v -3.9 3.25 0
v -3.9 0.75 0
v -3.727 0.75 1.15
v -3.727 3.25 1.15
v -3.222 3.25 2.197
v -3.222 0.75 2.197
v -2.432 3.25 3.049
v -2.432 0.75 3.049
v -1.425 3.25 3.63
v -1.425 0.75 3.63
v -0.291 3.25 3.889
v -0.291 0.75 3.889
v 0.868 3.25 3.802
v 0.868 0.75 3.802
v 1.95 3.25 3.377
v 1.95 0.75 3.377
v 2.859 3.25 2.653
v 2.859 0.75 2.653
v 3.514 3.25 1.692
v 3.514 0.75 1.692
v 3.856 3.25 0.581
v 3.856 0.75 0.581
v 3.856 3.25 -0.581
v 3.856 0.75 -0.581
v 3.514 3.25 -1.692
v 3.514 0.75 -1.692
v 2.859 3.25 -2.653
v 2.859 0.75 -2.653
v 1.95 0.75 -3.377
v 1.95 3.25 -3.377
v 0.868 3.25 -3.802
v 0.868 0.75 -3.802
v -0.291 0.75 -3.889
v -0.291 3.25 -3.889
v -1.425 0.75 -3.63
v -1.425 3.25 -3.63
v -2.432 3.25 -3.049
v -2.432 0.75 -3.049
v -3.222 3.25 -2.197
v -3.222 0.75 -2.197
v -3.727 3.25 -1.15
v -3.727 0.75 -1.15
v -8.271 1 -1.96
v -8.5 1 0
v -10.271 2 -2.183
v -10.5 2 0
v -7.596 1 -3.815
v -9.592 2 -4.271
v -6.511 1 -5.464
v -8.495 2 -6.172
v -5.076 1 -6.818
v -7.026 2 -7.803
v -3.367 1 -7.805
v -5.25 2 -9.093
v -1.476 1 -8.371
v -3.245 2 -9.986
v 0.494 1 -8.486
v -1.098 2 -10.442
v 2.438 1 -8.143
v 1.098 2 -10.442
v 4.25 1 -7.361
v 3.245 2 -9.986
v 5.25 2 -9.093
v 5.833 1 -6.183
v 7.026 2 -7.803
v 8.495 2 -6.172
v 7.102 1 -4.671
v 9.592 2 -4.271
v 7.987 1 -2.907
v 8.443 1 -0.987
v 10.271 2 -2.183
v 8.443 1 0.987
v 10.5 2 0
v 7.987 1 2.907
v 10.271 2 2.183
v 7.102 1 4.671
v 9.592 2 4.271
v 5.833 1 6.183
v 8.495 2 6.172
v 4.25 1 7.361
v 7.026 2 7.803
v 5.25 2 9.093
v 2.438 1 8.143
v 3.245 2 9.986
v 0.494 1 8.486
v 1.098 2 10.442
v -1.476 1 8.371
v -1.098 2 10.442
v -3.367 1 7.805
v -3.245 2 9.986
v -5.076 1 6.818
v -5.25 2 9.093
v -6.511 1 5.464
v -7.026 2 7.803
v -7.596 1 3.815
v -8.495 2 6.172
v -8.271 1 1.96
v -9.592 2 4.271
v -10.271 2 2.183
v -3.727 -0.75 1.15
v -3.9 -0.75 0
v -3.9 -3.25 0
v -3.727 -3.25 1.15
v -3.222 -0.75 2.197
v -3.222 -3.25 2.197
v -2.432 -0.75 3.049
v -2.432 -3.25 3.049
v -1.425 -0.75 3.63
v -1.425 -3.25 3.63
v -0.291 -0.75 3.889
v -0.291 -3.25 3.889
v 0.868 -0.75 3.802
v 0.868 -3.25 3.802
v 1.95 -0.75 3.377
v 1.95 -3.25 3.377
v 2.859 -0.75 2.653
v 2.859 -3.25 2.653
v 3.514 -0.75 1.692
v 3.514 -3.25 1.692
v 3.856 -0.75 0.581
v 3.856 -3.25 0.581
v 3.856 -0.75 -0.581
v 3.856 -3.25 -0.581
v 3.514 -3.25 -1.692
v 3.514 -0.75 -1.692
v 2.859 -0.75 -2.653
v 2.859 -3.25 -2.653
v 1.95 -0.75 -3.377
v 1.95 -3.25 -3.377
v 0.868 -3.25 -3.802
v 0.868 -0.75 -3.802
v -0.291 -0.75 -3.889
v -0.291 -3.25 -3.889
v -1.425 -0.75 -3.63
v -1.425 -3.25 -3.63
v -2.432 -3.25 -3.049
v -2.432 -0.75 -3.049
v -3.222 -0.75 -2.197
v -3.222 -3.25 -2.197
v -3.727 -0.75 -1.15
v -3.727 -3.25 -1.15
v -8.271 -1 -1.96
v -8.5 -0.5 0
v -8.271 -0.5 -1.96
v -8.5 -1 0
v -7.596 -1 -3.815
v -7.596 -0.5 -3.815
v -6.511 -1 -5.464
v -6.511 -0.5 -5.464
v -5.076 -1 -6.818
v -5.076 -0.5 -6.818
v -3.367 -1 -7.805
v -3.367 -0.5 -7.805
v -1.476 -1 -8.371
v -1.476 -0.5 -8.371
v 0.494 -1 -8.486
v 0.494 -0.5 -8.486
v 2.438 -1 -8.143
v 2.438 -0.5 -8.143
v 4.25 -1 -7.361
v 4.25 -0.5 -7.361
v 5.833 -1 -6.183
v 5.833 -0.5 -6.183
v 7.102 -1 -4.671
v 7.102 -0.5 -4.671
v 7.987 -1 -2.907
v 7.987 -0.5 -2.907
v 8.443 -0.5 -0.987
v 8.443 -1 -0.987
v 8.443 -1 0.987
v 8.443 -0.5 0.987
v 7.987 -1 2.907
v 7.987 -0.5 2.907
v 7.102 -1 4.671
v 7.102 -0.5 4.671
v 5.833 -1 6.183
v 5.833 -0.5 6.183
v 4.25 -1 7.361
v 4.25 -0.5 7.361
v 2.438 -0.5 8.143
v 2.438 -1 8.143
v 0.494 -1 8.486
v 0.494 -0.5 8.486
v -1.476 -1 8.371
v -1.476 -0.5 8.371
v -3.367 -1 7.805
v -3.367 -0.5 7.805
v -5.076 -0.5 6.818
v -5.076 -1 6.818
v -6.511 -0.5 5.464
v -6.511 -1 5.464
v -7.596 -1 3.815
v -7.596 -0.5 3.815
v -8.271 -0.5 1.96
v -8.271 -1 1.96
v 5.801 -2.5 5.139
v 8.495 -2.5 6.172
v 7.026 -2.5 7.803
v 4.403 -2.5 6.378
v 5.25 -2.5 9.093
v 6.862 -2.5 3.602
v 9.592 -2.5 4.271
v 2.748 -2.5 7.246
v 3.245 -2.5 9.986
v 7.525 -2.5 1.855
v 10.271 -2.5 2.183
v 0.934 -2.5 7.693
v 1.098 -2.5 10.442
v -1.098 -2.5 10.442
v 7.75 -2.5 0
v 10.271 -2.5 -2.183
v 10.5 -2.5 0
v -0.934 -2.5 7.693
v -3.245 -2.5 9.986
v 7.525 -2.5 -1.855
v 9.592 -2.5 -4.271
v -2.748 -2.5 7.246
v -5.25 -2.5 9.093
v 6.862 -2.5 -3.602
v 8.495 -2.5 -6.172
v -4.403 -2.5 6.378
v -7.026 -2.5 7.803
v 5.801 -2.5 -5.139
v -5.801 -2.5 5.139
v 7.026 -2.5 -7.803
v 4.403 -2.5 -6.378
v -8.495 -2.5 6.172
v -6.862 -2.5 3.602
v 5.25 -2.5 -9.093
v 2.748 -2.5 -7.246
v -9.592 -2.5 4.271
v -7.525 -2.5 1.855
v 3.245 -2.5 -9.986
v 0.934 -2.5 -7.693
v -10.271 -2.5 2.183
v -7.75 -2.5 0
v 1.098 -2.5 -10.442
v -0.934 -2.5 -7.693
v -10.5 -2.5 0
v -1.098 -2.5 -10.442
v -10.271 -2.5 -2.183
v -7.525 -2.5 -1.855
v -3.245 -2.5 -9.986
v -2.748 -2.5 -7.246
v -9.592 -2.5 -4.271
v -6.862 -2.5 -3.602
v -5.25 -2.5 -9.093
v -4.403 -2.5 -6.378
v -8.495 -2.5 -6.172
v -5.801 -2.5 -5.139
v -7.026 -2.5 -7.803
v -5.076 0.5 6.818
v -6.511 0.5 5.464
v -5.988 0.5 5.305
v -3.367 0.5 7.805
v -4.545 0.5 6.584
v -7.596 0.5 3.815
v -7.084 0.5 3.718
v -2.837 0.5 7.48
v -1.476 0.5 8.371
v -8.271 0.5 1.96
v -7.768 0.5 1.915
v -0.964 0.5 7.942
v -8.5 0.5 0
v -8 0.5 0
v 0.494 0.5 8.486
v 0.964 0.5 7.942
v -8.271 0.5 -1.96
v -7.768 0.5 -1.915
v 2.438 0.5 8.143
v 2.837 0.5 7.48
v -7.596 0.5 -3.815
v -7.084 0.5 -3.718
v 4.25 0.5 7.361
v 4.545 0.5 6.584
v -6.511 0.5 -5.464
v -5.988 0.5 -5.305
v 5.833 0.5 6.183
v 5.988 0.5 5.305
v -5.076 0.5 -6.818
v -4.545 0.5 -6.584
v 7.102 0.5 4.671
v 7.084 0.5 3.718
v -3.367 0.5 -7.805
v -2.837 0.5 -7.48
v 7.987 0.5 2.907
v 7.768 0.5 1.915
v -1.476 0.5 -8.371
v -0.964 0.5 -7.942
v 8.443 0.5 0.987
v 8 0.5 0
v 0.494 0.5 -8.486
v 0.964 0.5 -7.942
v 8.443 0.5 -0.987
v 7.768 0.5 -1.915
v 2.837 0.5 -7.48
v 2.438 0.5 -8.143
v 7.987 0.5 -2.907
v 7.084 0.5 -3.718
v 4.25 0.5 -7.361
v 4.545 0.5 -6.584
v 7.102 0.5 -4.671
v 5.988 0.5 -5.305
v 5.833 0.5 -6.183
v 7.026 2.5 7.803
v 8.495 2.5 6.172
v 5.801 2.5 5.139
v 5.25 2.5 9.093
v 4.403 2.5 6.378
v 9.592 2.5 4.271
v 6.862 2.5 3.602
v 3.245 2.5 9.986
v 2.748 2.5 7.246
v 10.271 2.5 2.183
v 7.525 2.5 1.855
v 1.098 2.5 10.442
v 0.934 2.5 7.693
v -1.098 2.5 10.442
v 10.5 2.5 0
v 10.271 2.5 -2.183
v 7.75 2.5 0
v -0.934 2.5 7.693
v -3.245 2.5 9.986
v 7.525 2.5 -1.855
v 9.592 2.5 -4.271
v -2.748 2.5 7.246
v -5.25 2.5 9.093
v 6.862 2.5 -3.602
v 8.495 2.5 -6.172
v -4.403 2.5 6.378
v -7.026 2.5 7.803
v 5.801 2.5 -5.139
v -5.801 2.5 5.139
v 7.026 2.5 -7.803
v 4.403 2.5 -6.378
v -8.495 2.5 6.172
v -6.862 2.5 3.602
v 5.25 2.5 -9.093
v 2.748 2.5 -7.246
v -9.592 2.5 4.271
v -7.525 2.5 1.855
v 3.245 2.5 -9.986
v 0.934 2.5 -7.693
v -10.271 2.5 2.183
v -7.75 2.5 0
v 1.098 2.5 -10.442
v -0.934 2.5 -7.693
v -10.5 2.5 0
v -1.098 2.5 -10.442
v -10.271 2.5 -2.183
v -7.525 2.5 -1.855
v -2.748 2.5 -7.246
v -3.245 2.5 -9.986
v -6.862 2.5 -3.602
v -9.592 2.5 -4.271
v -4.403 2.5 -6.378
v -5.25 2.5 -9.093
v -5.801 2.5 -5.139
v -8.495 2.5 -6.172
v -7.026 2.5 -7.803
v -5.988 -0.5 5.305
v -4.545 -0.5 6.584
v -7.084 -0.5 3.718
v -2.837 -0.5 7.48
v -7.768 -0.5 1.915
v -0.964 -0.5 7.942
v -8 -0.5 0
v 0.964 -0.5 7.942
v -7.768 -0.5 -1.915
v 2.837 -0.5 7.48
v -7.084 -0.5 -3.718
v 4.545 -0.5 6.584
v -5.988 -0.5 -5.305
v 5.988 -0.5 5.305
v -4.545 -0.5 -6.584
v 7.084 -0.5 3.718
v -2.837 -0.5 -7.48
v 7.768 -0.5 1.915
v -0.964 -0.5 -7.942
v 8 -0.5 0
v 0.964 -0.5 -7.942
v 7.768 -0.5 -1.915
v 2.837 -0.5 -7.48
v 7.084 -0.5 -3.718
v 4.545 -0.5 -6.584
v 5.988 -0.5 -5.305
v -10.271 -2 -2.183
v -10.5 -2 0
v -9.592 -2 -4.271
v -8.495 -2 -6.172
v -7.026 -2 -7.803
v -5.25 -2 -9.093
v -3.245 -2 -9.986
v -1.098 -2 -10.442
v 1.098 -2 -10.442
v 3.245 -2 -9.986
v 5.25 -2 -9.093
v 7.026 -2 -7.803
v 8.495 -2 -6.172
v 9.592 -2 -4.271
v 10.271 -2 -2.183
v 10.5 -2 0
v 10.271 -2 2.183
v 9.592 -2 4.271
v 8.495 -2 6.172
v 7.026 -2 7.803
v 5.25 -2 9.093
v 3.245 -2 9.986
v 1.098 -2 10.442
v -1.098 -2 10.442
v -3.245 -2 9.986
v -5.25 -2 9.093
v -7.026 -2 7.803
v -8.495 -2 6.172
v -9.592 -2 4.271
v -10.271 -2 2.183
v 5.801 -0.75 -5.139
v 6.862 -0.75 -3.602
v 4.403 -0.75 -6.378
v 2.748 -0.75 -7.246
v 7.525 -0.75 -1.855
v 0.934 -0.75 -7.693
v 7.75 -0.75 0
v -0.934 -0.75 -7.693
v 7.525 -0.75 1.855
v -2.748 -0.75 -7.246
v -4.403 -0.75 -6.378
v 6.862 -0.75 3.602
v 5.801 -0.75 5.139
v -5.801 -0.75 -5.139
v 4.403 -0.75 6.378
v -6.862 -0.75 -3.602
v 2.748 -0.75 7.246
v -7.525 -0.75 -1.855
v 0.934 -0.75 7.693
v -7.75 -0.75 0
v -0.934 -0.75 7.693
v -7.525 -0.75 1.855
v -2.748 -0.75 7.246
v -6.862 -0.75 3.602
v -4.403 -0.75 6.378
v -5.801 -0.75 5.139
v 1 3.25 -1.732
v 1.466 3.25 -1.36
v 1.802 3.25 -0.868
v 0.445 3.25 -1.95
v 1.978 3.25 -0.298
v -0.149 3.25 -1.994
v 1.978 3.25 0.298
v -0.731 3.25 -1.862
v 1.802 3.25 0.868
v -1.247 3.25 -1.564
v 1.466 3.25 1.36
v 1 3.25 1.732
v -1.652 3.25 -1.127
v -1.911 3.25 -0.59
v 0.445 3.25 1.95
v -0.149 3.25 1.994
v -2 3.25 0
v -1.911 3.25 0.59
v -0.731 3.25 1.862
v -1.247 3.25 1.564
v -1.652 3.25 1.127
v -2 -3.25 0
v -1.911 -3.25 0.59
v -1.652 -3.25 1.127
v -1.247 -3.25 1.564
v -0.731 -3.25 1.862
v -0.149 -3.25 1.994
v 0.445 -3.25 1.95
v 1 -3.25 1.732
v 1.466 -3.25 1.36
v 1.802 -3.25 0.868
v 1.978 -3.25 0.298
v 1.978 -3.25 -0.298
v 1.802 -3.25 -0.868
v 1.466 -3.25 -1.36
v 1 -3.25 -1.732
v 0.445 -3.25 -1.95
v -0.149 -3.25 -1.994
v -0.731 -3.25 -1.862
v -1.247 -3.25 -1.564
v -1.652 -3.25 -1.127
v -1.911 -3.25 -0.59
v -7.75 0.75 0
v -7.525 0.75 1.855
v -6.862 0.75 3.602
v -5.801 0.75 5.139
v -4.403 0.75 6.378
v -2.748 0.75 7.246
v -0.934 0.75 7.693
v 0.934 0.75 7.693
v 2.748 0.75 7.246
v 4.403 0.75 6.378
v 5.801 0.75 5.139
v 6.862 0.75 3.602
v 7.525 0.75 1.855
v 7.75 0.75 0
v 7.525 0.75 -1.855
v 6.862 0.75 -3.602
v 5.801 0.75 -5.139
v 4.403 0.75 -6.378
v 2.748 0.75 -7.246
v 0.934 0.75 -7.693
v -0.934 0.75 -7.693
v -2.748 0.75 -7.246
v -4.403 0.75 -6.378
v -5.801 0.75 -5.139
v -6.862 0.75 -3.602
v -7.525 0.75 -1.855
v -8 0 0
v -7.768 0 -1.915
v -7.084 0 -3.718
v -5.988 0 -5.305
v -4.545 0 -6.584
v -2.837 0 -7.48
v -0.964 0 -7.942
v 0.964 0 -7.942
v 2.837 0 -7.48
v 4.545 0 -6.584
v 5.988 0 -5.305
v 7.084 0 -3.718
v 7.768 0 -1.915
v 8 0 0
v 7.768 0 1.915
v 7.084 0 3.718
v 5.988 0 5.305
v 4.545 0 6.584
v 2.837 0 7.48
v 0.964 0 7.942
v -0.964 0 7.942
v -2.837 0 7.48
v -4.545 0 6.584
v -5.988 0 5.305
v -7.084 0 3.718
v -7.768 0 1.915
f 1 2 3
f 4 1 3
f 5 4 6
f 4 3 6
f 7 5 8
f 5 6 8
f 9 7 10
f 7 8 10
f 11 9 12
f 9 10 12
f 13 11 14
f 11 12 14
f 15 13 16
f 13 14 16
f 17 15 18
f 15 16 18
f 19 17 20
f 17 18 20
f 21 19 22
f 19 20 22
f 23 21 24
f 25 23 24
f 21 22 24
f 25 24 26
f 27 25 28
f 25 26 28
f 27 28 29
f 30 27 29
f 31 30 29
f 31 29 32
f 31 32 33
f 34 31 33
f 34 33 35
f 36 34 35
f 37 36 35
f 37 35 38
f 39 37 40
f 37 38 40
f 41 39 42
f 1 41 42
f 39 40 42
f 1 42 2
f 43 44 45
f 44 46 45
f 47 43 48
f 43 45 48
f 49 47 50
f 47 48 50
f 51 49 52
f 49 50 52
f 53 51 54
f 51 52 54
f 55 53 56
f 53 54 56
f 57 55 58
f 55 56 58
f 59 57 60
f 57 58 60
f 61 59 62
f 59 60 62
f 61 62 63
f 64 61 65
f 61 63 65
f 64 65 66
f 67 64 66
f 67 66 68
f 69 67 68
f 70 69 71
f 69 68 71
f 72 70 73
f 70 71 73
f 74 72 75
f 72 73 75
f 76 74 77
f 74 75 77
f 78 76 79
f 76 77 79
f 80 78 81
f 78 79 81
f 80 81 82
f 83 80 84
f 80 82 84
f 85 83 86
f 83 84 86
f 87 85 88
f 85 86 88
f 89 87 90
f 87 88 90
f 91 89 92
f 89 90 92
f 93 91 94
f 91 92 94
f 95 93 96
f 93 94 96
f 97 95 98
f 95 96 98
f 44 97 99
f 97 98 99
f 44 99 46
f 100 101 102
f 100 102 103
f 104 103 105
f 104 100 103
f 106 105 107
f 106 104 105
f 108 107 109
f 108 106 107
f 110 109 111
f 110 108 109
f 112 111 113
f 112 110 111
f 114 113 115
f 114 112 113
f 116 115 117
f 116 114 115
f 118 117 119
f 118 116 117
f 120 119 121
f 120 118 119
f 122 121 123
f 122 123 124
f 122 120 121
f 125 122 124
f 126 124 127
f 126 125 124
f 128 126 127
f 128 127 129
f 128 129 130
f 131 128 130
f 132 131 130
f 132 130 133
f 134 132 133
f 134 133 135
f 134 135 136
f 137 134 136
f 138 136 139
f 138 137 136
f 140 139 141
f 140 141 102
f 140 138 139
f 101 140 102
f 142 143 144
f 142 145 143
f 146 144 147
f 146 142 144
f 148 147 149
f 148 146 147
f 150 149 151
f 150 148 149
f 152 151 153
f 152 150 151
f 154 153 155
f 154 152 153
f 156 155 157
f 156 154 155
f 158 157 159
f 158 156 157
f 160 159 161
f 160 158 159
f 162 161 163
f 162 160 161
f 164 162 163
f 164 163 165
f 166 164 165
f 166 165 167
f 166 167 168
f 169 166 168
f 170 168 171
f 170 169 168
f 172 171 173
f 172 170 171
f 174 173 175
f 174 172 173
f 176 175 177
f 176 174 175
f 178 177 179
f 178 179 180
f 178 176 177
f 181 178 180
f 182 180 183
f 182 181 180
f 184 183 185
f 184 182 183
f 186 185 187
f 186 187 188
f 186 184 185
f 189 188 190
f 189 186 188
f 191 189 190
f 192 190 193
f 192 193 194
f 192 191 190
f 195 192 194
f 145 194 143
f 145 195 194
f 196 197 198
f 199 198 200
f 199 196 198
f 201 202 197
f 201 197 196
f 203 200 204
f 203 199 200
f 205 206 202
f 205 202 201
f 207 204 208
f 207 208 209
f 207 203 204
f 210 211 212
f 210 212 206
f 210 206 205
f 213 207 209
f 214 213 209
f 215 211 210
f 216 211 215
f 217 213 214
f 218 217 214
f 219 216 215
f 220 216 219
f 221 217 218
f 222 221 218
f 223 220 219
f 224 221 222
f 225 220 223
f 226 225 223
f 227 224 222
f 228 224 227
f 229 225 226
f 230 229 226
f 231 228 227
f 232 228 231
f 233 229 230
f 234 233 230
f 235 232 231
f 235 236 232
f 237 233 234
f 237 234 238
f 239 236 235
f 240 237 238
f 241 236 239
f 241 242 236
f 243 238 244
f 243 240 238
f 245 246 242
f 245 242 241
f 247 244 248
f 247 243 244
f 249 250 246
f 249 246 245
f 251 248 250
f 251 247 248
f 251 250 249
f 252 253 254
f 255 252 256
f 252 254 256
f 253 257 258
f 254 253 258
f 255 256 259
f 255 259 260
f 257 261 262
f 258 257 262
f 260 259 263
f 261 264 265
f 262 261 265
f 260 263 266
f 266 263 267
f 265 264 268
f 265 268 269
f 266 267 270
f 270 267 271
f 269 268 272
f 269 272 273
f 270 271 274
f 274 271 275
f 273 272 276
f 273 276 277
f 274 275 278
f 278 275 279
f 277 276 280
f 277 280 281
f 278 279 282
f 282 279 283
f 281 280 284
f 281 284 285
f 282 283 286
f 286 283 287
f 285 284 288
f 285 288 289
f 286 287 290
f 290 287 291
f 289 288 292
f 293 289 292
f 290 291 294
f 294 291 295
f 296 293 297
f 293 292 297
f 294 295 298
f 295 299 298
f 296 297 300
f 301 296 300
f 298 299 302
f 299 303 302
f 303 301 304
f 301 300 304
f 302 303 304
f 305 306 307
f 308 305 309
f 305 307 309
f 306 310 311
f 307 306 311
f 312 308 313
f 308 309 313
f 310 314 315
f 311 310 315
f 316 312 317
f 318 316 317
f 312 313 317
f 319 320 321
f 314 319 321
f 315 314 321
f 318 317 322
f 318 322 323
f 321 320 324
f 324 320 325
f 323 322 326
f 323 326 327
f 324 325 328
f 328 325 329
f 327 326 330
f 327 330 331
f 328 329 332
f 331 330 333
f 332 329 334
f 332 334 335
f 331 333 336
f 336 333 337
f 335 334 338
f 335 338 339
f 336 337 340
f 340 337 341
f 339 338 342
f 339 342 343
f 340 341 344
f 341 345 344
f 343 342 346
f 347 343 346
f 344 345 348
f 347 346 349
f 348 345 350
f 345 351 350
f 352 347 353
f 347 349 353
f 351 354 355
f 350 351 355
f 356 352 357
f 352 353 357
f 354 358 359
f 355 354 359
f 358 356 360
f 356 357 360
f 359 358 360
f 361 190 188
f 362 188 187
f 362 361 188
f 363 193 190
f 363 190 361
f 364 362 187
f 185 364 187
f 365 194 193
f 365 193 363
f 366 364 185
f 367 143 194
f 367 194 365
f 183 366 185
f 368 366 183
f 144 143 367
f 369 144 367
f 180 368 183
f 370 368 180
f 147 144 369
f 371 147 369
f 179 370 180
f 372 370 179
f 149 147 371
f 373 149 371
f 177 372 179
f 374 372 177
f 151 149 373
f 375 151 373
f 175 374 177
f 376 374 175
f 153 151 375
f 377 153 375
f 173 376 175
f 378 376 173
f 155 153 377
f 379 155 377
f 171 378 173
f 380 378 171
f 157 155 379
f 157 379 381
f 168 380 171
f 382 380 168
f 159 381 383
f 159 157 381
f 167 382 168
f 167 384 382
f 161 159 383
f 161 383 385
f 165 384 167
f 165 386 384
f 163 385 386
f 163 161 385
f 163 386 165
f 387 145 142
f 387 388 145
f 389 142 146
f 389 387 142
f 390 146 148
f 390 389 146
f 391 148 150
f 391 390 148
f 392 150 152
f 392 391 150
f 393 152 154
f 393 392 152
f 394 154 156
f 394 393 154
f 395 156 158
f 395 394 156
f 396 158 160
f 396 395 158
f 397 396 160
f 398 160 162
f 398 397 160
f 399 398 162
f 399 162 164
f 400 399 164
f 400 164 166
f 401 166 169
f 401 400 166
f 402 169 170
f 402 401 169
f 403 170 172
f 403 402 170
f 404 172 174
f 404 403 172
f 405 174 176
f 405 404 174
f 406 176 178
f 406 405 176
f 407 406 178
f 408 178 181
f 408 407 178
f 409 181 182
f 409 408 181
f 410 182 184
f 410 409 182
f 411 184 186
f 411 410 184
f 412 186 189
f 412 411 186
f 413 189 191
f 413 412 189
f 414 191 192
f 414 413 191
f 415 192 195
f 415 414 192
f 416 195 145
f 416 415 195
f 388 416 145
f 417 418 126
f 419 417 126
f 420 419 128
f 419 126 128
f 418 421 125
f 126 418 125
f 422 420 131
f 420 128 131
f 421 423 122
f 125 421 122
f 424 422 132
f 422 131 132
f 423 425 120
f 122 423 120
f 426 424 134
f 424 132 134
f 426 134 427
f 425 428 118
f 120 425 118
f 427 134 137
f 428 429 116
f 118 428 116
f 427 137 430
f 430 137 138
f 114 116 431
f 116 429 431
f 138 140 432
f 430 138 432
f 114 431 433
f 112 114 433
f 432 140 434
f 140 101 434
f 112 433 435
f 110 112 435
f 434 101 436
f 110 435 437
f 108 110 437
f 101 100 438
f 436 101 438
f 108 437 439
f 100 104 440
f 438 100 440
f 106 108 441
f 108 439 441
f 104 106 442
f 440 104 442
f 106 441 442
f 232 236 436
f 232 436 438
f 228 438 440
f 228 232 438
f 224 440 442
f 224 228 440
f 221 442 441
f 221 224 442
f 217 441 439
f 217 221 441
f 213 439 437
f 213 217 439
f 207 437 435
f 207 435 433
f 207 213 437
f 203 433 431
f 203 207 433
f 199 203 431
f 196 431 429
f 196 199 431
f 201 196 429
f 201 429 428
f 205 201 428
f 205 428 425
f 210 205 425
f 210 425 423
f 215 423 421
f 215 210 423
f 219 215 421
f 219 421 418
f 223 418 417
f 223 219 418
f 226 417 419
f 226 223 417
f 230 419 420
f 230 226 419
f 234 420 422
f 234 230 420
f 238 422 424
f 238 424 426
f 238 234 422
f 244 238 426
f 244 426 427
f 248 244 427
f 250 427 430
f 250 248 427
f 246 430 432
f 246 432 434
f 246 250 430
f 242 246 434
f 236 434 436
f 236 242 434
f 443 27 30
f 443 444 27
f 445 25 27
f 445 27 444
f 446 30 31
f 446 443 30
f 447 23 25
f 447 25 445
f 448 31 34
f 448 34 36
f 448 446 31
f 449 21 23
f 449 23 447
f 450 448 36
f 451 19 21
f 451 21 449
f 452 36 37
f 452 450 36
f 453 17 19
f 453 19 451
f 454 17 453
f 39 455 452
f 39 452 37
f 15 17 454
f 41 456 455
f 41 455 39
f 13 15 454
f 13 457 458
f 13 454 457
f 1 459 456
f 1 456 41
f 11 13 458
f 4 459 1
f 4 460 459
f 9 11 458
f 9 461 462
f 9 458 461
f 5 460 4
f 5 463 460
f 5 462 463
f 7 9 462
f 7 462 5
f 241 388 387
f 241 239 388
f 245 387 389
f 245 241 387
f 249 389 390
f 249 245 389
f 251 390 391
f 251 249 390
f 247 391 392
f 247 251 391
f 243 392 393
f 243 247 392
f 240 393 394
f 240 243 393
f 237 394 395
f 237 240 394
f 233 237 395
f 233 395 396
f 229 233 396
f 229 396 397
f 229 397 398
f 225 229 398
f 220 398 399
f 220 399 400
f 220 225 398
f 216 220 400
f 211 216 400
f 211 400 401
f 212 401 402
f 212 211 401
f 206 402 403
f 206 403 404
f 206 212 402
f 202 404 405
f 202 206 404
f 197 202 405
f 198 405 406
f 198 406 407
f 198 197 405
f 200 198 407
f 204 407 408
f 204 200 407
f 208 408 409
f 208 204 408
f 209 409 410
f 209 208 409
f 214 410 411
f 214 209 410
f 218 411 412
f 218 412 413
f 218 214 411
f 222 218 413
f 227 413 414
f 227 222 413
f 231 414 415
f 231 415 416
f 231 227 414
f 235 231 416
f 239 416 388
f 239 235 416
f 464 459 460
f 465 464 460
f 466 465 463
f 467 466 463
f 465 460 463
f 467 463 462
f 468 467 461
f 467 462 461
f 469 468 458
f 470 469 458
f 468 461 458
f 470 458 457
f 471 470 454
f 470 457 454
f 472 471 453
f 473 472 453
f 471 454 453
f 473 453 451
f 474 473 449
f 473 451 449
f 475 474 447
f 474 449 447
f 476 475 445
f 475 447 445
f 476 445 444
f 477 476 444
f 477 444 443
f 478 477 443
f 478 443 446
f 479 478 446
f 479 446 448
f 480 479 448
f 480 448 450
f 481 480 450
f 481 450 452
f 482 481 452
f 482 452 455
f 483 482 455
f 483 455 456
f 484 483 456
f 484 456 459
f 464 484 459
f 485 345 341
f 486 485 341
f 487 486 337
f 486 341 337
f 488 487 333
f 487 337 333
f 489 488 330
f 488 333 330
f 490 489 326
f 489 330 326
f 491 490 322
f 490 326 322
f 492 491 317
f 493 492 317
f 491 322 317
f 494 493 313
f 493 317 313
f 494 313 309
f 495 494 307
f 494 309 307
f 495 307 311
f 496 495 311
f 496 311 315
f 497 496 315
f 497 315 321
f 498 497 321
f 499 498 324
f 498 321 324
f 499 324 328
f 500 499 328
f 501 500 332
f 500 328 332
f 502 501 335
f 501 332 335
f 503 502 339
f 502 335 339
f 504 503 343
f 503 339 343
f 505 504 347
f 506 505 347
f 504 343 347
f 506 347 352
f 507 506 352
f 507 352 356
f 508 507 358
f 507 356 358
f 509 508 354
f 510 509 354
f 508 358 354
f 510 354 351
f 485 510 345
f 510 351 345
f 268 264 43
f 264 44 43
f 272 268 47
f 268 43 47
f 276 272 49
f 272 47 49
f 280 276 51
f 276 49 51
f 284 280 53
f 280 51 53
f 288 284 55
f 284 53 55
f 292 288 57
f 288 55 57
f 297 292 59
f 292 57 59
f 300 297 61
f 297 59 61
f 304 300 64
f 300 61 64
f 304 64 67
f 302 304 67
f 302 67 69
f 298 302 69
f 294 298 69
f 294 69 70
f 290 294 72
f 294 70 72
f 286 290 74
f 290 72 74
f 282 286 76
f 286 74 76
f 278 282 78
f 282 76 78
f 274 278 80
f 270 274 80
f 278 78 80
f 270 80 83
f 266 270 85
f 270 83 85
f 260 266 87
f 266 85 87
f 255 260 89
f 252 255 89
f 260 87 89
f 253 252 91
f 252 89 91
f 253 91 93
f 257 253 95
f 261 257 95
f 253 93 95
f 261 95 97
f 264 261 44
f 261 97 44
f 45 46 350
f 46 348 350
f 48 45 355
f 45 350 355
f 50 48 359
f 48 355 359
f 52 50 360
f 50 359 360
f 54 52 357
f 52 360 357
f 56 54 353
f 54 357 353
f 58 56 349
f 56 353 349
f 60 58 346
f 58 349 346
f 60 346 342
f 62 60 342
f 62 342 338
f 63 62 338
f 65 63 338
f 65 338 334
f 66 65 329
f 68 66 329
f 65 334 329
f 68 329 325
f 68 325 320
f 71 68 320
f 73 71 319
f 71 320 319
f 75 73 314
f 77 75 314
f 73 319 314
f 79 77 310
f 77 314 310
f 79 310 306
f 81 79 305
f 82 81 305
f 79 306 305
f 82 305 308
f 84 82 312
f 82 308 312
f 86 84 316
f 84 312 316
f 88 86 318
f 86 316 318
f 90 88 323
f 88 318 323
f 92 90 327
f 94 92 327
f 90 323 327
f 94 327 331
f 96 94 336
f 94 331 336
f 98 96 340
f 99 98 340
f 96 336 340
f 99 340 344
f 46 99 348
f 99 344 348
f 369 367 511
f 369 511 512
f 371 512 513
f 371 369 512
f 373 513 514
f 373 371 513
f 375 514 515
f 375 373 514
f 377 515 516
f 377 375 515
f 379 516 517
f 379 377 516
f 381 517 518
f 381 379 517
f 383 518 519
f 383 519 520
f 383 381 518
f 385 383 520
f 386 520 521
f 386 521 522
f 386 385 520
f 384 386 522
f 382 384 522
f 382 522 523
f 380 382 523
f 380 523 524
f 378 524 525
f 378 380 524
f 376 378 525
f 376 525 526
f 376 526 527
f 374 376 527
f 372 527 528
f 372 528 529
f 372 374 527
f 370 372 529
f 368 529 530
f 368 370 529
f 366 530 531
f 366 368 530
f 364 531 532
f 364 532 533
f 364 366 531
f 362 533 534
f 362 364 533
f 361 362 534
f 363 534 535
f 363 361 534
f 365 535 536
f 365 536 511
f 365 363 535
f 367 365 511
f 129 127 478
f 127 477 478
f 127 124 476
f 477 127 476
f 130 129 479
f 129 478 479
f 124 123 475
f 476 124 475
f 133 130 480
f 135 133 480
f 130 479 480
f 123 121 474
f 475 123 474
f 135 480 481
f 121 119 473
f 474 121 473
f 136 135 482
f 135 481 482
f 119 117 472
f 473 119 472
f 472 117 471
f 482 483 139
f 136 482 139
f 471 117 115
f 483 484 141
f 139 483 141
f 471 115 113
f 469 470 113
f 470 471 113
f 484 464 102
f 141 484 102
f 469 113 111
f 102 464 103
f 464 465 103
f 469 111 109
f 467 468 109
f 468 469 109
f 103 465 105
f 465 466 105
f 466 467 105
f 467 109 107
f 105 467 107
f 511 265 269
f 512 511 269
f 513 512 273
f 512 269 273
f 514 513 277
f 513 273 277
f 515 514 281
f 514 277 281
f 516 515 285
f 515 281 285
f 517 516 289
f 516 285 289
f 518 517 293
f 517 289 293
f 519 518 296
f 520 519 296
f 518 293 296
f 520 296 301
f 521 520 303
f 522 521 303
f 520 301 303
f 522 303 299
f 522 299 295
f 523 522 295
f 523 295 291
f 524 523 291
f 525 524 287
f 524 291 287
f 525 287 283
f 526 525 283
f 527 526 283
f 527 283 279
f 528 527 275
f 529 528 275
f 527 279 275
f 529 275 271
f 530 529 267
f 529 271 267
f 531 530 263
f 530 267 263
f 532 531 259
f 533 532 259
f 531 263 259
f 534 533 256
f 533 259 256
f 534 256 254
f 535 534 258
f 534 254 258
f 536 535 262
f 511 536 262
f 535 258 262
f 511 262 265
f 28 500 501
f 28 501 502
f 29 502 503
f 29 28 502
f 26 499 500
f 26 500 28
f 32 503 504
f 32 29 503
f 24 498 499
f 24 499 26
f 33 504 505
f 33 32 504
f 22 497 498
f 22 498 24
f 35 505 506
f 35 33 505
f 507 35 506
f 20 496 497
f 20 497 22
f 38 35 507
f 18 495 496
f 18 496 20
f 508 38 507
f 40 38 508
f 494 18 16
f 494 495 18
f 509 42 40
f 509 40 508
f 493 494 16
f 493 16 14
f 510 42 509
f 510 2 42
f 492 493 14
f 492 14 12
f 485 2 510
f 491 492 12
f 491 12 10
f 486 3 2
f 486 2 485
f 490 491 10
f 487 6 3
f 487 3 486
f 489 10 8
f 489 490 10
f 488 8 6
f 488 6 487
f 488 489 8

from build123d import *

# Parameters (mm, degrees)
SKETCH_2_R          = 7.75
CUT_EXTRUDE_1_DEPTH = 1.75
SKETCH_3_R          = 3.9
EXTRUDE_1_DEPTH     = 2.5
CUT_EXTRUDE_2_REACH = 18.21
SKETCH_4_R          = 2


with BuildPart() as part:
    # 草图1 → 旋转1 (revolve)
    with BuildSketch(Plane.XY):
        Polygon((0, 0), (-8, 0), (-8, 0.5), (-8.5, 0.5), (-8.5, 1), (-10.5, 2), (-10.5, 2.5), (0, 2.5), align=None)
    revolve_1 = revolve(axis=Axis((0, 2.5, 0), (0, -1, 0)))

    # 镜向1: 旋转1 across plane
    add(revolve_1.mirror(Plane.ZX))

    # 草图2 → 切除-拉伸1 (cut)
    with BuildSketch(Plane(origin=(0, 2.5, 0), x_dir=(1, 0, 0), z_dir=(0, 1, 0))):
        with Locations(Location((0, 0, 0), (0, 0, 180))):
            Circle(SKETCH_2_R)
    cut_extrude_1 = extrude(amount=-CUT_EXTRUDE_1_DEPTH, mode=Mode.SUBTRACT)

    # 草图3 → 凸台-拉伸1 (add)
    with BuildSketch(Plane(origin=(0, 0.75, 0), x_dir=(1, 0, 0), z_dir=(0, 1, 0))):
        with Locations(Location((0, 0, 0), (0, 0, 180))):
            Circle(SKETCH_3_R)
    extrude_1 = extrude(amount=EXTRUDE_1_DEPTH)

    # 镜向2: 切除-拉伸1, 凸台-拉伸1 across plane
    add(cut_extrude_1.mirror(Plane.ZX), mode=Mode.SUBTRACT)
    add(extrude_1.mirror(Plane.ZX))

    # 草图4 → 切除-拉伸2 (cut, up to next)
    with BuildSketch(Plane(origin=(0, 3.25, 0), x_dir=(1, 0, 0), z_dir=(0, 1, 0)), mode=Mode.PRIVATE) as cut_extrude_2_sk1:
        with Locations(Location((0, 0, 0), (0, 0, 180))):
            Circle(SKETCH_4_R)
    cut_extrude_2_tool1 = extrude(cut_extrude_2_sk1.sketch, amount=-CUT_EXTRUDE_2_REACH, mode=Mode.PRIVATE) & part.part
    add(cut_extrude_2_tool1.solids().sort_by_distance((0, 3.25, 0))[0], mode=Mode.SUBTRACT)


solid = part.part
